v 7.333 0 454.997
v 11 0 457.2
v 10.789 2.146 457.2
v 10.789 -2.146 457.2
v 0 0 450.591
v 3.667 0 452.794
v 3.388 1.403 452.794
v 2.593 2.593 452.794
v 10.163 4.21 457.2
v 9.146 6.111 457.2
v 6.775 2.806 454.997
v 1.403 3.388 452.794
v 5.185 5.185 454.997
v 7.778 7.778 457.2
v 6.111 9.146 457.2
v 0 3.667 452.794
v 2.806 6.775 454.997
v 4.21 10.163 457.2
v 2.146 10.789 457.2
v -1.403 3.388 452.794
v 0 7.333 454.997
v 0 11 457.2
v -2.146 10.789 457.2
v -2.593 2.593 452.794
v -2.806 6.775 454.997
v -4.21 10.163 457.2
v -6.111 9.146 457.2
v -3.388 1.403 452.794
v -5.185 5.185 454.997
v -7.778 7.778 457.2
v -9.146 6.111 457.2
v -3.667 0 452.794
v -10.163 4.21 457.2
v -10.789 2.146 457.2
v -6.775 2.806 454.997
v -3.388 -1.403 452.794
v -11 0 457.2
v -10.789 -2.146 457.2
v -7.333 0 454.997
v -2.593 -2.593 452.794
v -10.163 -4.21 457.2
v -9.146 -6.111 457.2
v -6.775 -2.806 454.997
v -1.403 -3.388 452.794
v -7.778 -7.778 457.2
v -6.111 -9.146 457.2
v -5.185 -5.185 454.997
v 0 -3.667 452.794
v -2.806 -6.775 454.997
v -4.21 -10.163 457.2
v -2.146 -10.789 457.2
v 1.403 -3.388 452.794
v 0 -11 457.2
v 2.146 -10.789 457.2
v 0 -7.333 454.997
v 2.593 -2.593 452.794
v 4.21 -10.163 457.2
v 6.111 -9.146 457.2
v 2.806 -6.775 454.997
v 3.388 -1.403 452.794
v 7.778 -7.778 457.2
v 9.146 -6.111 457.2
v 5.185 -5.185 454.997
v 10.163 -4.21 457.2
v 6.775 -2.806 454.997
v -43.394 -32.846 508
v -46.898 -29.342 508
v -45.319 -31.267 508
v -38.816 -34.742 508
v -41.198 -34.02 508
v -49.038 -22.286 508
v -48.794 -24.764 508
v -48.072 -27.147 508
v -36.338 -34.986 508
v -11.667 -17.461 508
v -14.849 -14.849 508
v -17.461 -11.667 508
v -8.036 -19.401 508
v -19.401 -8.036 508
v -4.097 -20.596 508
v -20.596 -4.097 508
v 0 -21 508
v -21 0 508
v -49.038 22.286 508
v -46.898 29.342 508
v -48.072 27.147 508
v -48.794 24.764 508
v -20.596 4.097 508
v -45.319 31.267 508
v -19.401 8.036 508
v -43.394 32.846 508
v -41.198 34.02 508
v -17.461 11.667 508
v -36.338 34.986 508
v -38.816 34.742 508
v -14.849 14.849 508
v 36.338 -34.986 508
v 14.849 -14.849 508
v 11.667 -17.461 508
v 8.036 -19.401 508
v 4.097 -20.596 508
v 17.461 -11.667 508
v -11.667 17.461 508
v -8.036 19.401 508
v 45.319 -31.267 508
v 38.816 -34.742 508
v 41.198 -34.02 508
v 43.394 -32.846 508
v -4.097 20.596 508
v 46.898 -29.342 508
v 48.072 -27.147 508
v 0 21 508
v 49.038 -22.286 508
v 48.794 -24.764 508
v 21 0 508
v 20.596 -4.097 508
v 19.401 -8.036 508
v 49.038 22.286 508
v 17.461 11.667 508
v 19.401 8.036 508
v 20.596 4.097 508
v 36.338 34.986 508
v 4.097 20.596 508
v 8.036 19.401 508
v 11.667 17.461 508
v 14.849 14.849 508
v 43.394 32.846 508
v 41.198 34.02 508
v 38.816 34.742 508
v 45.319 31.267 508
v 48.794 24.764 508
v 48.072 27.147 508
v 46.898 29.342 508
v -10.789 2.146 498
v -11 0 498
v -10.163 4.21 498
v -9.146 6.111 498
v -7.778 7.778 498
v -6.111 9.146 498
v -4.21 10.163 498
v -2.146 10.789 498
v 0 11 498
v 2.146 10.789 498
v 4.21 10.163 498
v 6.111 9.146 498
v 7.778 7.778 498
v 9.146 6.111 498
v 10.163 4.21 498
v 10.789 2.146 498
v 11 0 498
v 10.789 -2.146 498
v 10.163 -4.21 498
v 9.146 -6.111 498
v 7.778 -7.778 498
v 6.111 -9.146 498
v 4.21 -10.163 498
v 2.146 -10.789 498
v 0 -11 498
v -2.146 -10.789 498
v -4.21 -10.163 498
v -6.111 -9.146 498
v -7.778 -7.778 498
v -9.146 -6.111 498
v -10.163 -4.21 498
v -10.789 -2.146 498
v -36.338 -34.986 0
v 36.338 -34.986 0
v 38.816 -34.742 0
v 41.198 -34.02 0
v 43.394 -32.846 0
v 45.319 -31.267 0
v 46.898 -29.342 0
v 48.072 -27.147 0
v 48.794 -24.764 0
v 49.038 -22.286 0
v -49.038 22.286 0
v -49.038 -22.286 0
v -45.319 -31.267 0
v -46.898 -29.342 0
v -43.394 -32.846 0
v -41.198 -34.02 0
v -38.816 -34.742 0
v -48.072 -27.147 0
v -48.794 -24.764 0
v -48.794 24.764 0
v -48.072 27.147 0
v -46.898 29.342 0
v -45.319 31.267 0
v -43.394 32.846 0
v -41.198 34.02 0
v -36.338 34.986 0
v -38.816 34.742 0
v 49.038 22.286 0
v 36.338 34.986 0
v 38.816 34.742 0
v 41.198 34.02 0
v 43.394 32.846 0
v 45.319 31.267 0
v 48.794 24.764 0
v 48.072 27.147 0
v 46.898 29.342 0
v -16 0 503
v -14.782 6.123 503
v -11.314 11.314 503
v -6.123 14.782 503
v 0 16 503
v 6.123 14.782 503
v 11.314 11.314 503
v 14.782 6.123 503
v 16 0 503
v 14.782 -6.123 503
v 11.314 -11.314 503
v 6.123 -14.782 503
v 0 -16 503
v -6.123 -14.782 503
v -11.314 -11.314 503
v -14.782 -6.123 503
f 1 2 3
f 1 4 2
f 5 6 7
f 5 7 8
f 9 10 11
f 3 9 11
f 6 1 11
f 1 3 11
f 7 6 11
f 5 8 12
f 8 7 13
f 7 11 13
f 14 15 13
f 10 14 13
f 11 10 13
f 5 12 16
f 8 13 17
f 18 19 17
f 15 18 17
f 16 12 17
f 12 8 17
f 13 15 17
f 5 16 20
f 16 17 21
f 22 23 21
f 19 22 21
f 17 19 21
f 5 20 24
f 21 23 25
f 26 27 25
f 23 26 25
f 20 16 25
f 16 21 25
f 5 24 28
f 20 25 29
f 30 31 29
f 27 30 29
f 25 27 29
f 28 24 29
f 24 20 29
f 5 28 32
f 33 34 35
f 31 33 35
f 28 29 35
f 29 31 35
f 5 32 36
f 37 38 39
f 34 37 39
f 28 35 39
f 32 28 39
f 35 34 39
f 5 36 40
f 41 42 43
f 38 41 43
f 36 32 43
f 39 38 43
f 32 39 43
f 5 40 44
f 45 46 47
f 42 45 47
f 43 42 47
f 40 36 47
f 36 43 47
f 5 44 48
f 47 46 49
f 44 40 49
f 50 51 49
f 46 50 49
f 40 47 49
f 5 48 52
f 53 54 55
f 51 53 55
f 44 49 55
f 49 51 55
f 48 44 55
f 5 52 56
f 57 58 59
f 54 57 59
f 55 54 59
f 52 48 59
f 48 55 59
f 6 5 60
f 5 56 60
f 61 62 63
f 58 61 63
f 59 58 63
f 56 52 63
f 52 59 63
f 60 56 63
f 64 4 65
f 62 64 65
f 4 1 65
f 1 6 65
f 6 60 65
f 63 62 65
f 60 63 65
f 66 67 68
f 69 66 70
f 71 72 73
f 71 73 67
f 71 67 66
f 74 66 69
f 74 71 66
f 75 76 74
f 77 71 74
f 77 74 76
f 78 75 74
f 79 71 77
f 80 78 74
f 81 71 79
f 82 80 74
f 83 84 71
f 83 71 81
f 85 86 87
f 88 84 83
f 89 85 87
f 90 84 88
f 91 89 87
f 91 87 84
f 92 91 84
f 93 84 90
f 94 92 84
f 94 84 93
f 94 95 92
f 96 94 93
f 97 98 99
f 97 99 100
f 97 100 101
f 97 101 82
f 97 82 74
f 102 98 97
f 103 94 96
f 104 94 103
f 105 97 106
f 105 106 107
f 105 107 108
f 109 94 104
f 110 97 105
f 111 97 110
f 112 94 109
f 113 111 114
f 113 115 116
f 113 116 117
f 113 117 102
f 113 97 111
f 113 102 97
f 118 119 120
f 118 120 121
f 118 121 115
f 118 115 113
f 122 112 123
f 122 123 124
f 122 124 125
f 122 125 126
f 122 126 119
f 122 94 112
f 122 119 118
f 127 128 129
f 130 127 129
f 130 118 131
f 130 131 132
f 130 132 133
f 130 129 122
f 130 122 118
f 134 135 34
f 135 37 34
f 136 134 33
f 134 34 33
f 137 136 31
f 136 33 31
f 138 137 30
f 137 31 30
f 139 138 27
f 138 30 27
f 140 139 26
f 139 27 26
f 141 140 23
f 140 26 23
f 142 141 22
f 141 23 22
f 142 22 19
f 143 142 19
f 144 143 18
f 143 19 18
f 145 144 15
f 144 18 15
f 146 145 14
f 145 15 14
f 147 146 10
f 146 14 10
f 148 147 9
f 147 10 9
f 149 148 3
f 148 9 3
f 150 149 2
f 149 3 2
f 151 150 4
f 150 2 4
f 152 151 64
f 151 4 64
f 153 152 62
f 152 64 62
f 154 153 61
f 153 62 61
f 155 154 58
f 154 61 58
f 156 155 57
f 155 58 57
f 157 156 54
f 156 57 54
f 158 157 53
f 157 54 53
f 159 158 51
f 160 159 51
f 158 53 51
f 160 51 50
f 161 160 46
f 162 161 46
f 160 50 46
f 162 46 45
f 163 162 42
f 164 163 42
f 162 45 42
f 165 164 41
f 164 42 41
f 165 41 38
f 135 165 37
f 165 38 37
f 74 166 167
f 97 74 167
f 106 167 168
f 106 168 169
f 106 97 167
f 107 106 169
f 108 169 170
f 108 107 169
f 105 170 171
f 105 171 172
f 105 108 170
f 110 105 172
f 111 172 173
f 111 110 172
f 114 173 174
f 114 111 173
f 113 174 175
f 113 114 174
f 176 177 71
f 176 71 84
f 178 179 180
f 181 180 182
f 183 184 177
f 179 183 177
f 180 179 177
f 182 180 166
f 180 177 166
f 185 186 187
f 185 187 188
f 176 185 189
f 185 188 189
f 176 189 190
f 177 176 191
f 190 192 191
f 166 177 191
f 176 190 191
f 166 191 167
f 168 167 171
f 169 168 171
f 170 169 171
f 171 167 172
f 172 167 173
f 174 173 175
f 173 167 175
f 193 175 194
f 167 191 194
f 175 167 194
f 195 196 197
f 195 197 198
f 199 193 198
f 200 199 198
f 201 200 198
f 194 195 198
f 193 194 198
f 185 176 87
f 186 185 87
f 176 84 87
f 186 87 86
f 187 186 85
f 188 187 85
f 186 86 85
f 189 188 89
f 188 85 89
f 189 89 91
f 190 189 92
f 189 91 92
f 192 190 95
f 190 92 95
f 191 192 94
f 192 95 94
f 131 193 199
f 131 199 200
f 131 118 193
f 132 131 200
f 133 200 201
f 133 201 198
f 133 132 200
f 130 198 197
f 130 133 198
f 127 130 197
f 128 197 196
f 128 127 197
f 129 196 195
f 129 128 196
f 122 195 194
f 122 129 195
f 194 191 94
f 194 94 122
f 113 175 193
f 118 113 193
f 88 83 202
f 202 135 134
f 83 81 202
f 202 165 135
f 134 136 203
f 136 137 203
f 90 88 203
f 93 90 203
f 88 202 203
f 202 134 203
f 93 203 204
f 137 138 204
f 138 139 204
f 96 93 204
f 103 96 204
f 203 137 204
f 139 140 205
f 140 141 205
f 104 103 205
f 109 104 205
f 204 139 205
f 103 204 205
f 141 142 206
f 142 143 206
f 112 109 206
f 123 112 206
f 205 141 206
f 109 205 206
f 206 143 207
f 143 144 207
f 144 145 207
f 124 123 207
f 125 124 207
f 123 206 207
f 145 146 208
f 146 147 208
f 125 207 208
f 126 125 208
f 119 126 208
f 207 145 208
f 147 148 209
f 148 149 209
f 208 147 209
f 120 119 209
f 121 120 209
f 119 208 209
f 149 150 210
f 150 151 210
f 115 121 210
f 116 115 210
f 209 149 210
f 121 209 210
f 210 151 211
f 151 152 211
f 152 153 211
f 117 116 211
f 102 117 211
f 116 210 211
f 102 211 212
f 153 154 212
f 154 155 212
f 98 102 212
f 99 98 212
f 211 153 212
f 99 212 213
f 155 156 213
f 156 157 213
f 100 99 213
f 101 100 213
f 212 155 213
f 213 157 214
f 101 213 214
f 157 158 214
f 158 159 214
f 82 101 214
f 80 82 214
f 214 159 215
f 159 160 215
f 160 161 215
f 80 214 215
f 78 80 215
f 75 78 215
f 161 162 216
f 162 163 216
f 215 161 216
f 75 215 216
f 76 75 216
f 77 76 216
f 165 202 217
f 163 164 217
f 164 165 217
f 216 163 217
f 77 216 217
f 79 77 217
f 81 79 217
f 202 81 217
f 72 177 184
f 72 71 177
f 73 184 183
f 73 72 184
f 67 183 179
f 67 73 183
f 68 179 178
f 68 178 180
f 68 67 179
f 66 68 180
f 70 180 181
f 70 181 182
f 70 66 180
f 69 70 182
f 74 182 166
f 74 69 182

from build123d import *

# Parameters (mm, degrees)
F0_W           = 98.0767756701
F0_H           = 69.9729025364
F1_DEPTH       = 508
F2_R           = 12.7
F4_D           = 22
F4_DEPTH       = 50.8
F4_CSINK_D     = 42
F4_CSINK_ANGLE = 90
F4_TIP         = 6.6094668093


with BuildPart() as f1:
    # F0 (on Top) → F1 (new body)
    with BuildSketch(Plane.XY):
        Rectangle(F0_W, F0_H)
    extrude(amount=F1_DEPTH)

    # F2
    f2_edges = [f1.edges().sort_by_distance(p)[0] for p in [
        (49.038388, 34.986451, 254),
        (-49.038388, 34.986451, 254),
        (-49.038388, -34.986451, 254),
        (49.038388, -34.986451, 254),
    ]]
    fillet(f2_edges, radius=F2_R)

    # F4
    with Locations(Plane.XY.offset(508)):
        with Locations((0, 0)):
            CounterSinkHole(F4_D / 2, F4_CSINK_D / 2, depth=F4_DEPTH, counter_sink_angle=F4_CSINK_ANGLE)
            with Locations((0, 0, -(F4_DEPTH + F4_TIP / 2))):  # 118° drill point
                Cone(0, F4_D / 2, F4_TIP, mode=Mode.SUBTRACT)


solid = f1.part
